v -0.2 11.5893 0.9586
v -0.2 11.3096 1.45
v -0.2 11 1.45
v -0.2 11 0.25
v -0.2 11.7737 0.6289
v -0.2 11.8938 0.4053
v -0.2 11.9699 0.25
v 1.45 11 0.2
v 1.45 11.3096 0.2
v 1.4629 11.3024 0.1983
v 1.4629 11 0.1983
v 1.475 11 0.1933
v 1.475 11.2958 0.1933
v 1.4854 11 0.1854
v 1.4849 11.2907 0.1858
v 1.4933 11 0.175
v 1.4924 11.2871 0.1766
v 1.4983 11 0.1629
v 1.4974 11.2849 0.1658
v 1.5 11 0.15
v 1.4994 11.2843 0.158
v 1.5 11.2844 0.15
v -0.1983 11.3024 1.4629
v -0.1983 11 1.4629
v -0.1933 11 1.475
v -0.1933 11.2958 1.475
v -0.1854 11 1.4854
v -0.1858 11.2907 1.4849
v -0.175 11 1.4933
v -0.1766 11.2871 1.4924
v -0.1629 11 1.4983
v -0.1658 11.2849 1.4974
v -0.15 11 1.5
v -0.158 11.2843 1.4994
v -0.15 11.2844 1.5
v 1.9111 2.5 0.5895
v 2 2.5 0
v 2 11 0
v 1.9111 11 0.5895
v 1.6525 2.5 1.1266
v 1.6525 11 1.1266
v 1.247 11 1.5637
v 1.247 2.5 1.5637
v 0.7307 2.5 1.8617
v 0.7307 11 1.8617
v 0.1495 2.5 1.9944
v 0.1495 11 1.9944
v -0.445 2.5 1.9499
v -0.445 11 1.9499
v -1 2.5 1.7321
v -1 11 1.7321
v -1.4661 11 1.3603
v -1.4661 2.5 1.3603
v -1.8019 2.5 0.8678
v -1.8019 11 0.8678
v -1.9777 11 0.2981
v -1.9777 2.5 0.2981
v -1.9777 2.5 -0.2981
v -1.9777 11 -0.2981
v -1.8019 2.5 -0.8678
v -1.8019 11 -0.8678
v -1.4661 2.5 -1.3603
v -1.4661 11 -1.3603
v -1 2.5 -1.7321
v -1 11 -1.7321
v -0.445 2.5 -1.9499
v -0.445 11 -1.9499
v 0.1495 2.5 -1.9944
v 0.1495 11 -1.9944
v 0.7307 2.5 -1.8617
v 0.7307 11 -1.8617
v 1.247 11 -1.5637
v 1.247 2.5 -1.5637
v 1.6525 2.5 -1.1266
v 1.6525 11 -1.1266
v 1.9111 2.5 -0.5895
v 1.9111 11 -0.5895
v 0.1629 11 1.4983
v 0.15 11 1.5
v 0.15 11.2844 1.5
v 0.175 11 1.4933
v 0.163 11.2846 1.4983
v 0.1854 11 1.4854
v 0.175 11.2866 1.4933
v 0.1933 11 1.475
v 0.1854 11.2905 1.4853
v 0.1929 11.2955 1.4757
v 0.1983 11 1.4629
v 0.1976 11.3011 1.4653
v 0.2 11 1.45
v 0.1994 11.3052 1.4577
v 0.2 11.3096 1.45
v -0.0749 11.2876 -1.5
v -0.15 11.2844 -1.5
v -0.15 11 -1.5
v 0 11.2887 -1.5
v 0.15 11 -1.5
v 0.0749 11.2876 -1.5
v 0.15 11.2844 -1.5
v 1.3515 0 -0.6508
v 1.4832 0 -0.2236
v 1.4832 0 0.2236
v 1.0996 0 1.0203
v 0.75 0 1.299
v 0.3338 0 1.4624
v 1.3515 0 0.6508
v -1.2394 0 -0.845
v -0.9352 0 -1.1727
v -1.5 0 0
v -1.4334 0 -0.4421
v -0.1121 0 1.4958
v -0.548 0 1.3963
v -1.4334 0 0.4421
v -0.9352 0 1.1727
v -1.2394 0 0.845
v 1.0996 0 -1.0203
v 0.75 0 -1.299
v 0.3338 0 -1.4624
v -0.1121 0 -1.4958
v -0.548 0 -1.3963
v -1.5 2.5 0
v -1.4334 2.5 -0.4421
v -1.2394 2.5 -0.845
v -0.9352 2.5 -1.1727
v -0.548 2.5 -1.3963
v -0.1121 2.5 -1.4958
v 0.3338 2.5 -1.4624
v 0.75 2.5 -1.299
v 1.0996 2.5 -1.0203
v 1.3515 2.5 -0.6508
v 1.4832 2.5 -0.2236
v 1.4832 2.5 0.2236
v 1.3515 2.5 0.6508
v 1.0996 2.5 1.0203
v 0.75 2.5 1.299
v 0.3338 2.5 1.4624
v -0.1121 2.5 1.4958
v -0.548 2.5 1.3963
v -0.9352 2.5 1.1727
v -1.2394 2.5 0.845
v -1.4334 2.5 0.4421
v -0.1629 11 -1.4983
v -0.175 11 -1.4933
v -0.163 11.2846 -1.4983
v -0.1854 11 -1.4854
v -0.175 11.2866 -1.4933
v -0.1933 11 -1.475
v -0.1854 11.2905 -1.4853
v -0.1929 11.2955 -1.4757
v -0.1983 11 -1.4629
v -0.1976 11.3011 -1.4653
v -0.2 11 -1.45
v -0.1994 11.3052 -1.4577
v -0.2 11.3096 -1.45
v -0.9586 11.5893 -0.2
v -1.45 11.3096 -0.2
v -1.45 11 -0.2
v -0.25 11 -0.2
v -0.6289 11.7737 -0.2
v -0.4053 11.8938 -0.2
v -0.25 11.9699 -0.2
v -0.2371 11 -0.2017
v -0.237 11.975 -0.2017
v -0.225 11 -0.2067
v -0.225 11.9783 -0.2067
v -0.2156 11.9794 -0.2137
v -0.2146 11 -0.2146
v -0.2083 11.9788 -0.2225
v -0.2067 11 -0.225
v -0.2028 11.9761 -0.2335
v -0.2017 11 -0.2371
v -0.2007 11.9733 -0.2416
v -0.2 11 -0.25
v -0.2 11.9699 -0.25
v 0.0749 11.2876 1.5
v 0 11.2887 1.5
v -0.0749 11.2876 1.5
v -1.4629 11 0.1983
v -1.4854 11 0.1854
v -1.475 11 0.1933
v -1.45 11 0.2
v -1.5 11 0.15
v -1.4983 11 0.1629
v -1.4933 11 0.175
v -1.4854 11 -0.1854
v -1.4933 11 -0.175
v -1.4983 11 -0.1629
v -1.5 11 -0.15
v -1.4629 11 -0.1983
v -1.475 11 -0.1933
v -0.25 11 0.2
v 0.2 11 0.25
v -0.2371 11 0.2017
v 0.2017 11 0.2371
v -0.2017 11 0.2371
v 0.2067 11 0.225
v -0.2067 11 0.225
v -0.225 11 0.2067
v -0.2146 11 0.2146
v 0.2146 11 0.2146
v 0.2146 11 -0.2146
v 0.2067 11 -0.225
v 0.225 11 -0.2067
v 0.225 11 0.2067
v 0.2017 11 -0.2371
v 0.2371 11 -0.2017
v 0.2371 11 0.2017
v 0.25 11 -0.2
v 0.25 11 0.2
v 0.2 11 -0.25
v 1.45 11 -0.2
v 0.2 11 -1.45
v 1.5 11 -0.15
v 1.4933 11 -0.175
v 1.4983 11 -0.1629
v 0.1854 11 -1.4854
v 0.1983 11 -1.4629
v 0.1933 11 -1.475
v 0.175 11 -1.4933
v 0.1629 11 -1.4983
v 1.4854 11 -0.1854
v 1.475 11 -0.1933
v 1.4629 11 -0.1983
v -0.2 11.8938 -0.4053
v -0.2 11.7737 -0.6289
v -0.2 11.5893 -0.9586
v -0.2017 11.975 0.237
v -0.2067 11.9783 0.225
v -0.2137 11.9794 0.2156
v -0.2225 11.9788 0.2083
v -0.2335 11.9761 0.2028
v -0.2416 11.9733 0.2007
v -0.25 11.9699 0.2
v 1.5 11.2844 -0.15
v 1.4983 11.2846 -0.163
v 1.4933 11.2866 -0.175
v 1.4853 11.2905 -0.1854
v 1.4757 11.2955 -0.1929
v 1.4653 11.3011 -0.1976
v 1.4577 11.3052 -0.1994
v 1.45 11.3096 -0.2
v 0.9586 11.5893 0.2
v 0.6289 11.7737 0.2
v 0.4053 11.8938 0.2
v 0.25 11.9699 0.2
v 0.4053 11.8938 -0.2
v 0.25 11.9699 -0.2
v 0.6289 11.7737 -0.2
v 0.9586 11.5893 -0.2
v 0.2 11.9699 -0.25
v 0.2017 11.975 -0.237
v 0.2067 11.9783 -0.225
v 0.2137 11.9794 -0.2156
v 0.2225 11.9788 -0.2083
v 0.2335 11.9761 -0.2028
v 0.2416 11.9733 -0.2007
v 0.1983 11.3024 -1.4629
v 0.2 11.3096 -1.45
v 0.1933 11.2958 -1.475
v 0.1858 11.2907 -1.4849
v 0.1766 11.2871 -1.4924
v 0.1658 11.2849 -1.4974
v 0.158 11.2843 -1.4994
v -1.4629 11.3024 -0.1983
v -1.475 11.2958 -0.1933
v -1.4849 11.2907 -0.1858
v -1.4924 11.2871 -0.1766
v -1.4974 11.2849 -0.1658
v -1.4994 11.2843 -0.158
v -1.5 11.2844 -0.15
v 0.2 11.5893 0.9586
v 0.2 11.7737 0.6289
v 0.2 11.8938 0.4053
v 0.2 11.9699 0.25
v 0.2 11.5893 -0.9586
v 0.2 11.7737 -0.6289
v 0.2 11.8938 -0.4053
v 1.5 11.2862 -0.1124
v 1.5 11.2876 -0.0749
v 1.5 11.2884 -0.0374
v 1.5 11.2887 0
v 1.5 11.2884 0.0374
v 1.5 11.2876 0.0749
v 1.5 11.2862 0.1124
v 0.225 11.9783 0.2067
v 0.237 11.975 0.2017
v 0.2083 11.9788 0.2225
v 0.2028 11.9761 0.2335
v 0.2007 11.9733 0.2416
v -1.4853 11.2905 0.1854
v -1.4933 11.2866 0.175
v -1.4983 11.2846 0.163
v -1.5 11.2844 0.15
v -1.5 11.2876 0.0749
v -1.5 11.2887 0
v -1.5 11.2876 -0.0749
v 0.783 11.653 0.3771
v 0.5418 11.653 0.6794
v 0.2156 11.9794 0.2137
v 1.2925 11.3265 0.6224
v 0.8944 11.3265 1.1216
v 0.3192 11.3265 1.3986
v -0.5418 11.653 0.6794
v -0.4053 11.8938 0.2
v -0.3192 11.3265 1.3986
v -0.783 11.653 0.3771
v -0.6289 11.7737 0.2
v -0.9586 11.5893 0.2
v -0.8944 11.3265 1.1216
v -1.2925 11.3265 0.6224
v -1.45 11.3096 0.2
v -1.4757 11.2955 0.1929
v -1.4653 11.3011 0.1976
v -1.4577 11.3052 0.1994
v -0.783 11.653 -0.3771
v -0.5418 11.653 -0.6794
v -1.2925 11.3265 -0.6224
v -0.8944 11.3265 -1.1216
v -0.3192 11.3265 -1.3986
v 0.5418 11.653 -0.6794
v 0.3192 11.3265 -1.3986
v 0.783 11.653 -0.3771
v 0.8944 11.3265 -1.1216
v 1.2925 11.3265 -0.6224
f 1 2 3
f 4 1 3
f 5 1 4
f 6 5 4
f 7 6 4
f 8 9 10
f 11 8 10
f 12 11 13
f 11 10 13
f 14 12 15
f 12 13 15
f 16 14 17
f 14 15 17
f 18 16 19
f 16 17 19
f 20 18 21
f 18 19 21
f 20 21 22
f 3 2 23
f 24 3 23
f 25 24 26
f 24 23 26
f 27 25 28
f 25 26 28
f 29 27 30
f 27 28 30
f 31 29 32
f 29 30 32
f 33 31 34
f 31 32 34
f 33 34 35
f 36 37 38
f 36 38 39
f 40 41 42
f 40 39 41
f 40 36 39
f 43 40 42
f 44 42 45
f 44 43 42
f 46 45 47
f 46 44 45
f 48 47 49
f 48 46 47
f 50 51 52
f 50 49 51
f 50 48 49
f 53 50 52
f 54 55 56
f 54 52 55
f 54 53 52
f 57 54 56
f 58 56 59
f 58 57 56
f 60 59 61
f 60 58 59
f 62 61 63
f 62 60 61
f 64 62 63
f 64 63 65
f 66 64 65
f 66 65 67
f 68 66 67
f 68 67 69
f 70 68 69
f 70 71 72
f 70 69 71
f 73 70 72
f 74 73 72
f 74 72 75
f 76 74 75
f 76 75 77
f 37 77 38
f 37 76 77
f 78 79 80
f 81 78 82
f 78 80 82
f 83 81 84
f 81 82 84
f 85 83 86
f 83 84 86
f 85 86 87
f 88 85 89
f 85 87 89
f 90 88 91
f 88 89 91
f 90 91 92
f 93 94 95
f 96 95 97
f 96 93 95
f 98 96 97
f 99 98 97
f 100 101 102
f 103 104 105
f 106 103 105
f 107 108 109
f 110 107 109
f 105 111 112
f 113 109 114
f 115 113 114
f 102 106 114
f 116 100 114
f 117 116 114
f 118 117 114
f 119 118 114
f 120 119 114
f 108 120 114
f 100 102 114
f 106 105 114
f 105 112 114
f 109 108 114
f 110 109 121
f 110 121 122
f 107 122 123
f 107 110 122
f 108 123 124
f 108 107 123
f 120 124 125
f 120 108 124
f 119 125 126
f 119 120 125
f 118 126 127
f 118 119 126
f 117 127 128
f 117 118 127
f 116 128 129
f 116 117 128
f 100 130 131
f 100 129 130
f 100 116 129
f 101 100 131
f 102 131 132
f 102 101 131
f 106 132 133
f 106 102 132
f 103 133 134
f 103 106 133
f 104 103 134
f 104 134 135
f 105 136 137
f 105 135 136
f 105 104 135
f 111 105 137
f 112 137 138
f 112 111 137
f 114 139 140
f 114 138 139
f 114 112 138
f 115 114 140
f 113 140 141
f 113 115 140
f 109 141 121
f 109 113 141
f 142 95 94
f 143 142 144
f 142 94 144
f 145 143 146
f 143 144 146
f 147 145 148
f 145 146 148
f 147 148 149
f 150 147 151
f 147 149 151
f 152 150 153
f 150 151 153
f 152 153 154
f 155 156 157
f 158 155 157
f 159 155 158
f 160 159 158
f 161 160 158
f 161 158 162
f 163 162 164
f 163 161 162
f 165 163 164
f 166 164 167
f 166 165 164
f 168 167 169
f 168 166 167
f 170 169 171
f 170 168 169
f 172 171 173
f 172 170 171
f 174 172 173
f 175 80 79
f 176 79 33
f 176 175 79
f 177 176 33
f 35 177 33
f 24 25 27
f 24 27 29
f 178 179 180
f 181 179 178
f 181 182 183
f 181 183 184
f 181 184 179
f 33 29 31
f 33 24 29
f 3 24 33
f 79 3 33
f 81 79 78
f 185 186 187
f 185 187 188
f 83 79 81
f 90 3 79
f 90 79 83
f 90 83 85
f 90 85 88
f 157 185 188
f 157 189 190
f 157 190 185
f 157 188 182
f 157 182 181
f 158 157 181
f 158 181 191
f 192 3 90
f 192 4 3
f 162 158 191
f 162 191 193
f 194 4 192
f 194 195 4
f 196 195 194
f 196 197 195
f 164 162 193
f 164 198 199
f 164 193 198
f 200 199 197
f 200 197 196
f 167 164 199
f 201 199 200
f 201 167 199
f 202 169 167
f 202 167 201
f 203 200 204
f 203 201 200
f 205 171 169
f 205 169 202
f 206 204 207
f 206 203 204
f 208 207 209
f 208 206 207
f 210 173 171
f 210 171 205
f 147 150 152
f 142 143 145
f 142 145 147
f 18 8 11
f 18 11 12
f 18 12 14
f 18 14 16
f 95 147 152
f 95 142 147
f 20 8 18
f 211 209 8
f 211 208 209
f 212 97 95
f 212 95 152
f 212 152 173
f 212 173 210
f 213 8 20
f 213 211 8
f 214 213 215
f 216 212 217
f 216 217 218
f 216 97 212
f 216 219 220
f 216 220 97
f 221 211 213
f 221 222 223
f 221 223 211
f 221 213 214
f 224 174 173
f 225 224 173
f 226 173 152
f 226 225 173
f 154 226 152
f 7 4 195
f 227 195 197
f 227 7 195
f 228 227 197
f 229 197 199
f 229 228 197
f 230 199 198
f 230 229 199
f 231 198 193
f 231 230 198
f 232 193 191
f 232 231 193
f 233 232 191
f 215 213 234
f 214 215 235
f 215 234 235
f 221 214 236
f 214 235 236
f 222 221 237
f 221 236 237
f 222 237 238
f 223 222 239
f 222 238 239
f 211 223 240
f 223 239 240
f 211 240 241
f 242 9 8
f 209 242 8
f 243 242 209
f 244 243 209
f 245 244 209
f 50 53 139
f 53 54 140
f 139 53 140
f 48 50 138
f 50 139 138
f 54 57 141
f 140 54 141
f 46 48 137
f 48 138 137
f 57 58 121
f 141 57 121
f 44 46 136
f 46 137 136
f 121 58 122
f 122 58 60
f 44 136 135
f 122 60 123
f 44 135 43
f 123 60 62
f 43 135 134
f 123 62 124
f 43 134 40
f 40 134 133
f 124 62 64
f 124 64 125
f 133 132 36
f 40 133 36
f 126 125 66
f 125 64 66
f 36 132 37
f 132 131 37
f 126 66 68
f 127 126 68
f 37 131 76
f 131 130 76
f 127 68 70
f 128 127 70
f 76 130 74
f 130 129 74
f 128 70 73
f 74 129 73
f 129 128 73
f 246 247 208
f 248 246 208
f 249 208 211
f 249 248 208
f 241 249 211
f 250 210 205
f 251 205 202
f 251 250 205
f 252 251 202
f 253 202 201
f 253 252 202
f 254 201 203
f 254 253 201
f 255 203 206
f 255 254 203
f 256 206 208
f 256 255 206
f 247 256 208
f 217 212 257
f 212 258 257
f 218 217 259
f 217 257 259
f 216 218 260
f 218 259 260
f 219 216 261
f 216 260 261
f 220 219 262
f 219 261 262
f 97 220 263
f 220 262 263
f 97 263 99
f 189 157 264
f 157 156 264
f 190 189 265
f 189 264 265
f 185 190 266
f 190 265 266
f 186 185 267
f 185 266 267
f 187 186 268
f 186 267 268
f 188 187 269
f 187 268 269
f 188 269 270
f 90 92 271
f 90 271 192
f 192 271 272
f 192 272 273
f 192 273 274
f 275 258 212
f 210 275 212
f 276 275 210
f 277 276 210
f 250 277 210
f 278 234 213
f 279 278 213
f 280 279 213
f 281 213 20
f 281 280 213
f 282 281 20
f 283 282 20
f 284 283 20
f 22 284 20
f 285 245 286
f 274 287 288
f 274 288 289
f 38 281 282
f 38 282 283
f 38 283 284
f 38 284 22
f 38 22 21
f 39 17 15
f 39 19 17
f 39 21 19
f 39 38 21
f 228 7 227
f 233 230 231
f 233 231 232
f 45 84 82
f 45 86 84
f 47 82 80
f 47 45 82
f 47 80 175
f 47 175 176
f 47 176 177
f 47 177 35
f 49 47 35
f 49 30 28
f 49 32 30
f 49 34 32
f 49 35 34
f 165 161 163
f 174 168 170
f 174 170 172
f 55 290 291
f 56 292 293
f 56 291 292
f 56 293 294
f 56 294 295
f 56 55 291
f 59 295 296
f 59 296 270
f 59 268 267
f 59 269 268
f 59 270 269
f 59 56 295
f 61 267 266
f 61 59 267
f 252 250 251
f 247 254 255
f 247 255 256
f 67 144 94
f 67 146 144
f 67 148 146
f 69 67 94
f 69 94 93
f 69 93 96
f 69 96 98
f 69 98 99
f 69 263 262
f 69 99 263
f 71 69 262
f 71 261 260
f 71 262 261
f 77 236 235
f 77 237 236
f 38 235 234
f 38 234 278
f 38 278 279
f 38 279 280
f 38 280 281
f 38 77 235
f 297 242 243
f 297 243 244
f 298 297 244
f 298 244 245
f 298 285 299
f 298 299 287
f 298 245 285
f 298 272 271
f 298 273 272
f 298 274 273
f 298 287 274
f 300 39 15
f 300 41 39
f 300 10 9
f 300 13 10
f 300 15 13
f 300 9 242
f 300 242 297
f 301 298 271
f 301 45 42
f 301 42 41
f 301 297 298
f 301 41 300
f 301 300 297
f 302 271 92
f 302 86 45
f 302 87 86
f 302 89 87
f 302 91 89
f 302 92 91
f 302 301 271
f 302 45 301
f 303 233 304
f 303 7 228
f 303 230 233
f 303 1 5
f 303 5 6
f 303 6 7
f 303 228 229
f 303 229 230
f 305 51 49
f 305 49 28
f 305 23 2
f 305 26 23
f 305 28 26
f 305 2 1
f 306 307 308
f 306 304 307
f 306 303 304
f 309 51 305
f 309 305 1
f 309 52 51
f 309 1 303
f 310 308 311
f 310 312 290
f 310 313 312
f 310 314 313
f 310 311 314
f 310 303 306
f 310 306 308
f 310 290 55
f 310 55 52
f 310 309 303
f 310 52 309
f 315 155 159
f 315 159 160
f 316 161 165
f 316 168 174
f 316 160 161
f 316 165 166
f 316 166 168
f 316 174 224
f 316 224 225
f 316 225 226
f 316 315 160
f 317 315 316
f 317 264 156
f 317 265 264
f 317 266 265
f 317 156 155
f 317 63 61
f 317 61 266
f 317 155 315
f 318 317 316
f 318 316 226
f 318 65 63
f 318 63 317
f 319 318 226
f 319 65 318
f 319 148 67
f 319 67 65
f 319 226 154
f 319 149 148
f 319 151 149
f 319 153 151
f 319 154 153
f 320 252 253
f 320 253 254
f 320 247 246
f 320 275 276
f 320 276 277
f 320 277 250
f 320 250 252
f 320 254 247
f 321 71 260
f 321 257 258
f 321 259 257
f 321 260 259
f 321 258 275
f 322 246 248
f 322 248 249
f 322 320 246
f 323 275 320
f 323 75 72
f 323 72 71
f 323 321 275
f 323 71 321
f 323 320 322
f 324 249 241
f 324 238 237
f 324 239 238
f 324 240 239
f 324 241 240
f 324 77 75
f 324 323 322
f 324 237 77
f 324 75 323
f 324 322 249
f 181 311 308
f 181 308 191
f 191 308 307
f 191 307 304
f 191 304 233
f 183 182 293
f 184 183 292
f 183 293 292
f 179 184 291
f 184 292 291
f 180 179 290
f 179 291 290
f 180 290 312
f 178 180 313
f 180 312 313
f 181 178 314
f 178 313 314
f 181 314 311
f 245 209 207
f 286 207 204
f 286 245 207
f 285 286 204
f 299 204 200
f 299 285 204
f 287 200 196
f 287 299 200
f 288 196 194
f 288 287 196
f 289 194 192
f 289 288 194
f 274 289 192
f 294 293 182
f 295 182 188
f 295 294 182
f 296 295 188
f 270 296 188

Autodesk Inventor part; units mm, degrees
ref_plane "YZ Plane" through (0, 0, 0) normal (1, 0, 0) x (0, 1, 0)
ref_plane "XZ Plane" through (0, 0, 0) normal (0, 1, 0) x (-1, 0, 0)
ref_plane "XY Plane" through (0, 0, 0) normal (0, 0, 1) x (1, 0, 0)
sketch "Sketch1" plane through (0, 0, 0) normal (0, 1, 0) x (-1, 0, 0)
  circle A0 centre (0, 0) radius 1.5
  dimension "d0" = 3
extrude "Extrusion1" add sketch "Sketch1" along normal blind 2.5
sketch "Sketch2" plane through (0, 2.5, 0) normal (0, 1, 0) x (1, 0, 0)
  circle A0 centre (0, 0) radius 2
  dimension "d3" = 4
extrude "Extrusion2" add sketch "Sketch2" along normal blind 8.5
thread "Thread1" size "M3x0.5" class "6g" standard "ANSI Metric M Profile" length 5.5
sketch "Sketch3" plane through (0, 11, 0) normal (0, 1, 0) x (1, 0, 0)
  circle A0 centre (0, 0) radius 2
  dimension "d8" = 4
extrude "Extrusion3" add sketch "Sketch3" along normal blind 1 draft -60
sketch "Sketch4" plane through (0, 12, 0) normal (0, 1, 0) x (1, 0, 0)
  line L0 (-0.15, 1.5) -> (0.15, 1.5)
  line L1 (0.2, 1.45) -> (0.2, 0.25)
  line L2 (0.15, -1.5) -> (-0.15, -1.5)
  line L3 (-0.2, 0.25) -> (-0.2, 1.45)
  line L4 (-0.2, 1.5) -> (0.2, -1.5) construction
  line L5 (0.2, 1.5) -> (-0.2, -1.5) construction
  line L6 (0.25, 0.2) -> (1.45, 0.2)
  line L7 (1.5, 0.15) -> (1.5, -0.15)
  line L8 (1.45, -0.2) -> (0.25, -0.2)
  line L9 (-1.5, -0.15) -> (-1.5, 0.15)
  circle A0 centre (0, 0) radius 0.2679 projected
  line L10 (-1.5, 0.2) -> (1.5, -0.2) construction
  line L11 (1.5, 0.2) -> (-1.5, -0.2) construction
  arc A1 (-0.15, 1.5) -> (-0.2, 1.45) centre (-0.15, 1.45) ccw
  arc A2 (0.2, 1.45) -> (0.15, 1.5) centre (0.15, 1.45) ccw
  arc A3 (0.2, 0.25) -> (0.25, 0.2) centre (0.25, 0.25) ccw
  arc A4 (1.5, 0.15) -> (1.45, 0.2) centre (1.45, 0.15) ccw
  arc A5 (1.45, -0.2) -> (1.5, -0.15) centre (1.45, -0.15) ccw
  line L12 (0.2, -1.45) -> (0.2, -0.25)
  line L13 (-1.45, 0.2) -> (-0.25, 0.2)
  arc A6 (0.25, -0.2) -> (0.2, -0.25) centre (0.25, -0.25) ccw
  arc A7 (-0.25, 0.2) -> (-0.2, 0.25) centre (-0.25, 0.25) ccw
  line L14 (-1.45, -0.2) -> (-0.25, -0.2)
  line L15 (-0.2, -1.45) -> (-0.2, -0.25)
  arc A8 (-0.2, -0.25) -> (-0.25, -0.2) centre (-0.25, -0.25) ccw
  arc A9 (-1.45, 0.2) -> (-1.5, 0.15) centre (-1.45, 0.15) ccw
  arc A10 (-1.5, -0.15) -> (-1.45, -0.2) centre (-1.45, -0.15) ccw
  arc A11 (-0.2, -1.45) -> (-0.15, -1.5) centre (-0.15, -1.45) ccw
  arc A12 (0.15, -1.5) -> (0.2, -1.45) centre (0.15, -1.45) ccw
  point P0 (0.25, 0.2)
  point P1 (0.3698, -0.2)
  point P2 (-0.2, 0.3871)
  dimension "d11" = 0.4
  dimension "d12" = 3
  dimension "d13" = 3
  dimension "d14" = 0.4
  dimension "d15" = 0.05
  dimension "d16" = 0.05
  dimension "d17" = 0.05
extrude "Extrusion4" cut sketch "Sketch4" against normal blind 1 contours L0 A2 L1 A3 L6 A4 L7 A5 L8 A6 L12 A12 L2 A11 L15 A8 L14 A10 L9 A9 L13 A7 L3 A1 | A0
properties material "Stainless Steel"
